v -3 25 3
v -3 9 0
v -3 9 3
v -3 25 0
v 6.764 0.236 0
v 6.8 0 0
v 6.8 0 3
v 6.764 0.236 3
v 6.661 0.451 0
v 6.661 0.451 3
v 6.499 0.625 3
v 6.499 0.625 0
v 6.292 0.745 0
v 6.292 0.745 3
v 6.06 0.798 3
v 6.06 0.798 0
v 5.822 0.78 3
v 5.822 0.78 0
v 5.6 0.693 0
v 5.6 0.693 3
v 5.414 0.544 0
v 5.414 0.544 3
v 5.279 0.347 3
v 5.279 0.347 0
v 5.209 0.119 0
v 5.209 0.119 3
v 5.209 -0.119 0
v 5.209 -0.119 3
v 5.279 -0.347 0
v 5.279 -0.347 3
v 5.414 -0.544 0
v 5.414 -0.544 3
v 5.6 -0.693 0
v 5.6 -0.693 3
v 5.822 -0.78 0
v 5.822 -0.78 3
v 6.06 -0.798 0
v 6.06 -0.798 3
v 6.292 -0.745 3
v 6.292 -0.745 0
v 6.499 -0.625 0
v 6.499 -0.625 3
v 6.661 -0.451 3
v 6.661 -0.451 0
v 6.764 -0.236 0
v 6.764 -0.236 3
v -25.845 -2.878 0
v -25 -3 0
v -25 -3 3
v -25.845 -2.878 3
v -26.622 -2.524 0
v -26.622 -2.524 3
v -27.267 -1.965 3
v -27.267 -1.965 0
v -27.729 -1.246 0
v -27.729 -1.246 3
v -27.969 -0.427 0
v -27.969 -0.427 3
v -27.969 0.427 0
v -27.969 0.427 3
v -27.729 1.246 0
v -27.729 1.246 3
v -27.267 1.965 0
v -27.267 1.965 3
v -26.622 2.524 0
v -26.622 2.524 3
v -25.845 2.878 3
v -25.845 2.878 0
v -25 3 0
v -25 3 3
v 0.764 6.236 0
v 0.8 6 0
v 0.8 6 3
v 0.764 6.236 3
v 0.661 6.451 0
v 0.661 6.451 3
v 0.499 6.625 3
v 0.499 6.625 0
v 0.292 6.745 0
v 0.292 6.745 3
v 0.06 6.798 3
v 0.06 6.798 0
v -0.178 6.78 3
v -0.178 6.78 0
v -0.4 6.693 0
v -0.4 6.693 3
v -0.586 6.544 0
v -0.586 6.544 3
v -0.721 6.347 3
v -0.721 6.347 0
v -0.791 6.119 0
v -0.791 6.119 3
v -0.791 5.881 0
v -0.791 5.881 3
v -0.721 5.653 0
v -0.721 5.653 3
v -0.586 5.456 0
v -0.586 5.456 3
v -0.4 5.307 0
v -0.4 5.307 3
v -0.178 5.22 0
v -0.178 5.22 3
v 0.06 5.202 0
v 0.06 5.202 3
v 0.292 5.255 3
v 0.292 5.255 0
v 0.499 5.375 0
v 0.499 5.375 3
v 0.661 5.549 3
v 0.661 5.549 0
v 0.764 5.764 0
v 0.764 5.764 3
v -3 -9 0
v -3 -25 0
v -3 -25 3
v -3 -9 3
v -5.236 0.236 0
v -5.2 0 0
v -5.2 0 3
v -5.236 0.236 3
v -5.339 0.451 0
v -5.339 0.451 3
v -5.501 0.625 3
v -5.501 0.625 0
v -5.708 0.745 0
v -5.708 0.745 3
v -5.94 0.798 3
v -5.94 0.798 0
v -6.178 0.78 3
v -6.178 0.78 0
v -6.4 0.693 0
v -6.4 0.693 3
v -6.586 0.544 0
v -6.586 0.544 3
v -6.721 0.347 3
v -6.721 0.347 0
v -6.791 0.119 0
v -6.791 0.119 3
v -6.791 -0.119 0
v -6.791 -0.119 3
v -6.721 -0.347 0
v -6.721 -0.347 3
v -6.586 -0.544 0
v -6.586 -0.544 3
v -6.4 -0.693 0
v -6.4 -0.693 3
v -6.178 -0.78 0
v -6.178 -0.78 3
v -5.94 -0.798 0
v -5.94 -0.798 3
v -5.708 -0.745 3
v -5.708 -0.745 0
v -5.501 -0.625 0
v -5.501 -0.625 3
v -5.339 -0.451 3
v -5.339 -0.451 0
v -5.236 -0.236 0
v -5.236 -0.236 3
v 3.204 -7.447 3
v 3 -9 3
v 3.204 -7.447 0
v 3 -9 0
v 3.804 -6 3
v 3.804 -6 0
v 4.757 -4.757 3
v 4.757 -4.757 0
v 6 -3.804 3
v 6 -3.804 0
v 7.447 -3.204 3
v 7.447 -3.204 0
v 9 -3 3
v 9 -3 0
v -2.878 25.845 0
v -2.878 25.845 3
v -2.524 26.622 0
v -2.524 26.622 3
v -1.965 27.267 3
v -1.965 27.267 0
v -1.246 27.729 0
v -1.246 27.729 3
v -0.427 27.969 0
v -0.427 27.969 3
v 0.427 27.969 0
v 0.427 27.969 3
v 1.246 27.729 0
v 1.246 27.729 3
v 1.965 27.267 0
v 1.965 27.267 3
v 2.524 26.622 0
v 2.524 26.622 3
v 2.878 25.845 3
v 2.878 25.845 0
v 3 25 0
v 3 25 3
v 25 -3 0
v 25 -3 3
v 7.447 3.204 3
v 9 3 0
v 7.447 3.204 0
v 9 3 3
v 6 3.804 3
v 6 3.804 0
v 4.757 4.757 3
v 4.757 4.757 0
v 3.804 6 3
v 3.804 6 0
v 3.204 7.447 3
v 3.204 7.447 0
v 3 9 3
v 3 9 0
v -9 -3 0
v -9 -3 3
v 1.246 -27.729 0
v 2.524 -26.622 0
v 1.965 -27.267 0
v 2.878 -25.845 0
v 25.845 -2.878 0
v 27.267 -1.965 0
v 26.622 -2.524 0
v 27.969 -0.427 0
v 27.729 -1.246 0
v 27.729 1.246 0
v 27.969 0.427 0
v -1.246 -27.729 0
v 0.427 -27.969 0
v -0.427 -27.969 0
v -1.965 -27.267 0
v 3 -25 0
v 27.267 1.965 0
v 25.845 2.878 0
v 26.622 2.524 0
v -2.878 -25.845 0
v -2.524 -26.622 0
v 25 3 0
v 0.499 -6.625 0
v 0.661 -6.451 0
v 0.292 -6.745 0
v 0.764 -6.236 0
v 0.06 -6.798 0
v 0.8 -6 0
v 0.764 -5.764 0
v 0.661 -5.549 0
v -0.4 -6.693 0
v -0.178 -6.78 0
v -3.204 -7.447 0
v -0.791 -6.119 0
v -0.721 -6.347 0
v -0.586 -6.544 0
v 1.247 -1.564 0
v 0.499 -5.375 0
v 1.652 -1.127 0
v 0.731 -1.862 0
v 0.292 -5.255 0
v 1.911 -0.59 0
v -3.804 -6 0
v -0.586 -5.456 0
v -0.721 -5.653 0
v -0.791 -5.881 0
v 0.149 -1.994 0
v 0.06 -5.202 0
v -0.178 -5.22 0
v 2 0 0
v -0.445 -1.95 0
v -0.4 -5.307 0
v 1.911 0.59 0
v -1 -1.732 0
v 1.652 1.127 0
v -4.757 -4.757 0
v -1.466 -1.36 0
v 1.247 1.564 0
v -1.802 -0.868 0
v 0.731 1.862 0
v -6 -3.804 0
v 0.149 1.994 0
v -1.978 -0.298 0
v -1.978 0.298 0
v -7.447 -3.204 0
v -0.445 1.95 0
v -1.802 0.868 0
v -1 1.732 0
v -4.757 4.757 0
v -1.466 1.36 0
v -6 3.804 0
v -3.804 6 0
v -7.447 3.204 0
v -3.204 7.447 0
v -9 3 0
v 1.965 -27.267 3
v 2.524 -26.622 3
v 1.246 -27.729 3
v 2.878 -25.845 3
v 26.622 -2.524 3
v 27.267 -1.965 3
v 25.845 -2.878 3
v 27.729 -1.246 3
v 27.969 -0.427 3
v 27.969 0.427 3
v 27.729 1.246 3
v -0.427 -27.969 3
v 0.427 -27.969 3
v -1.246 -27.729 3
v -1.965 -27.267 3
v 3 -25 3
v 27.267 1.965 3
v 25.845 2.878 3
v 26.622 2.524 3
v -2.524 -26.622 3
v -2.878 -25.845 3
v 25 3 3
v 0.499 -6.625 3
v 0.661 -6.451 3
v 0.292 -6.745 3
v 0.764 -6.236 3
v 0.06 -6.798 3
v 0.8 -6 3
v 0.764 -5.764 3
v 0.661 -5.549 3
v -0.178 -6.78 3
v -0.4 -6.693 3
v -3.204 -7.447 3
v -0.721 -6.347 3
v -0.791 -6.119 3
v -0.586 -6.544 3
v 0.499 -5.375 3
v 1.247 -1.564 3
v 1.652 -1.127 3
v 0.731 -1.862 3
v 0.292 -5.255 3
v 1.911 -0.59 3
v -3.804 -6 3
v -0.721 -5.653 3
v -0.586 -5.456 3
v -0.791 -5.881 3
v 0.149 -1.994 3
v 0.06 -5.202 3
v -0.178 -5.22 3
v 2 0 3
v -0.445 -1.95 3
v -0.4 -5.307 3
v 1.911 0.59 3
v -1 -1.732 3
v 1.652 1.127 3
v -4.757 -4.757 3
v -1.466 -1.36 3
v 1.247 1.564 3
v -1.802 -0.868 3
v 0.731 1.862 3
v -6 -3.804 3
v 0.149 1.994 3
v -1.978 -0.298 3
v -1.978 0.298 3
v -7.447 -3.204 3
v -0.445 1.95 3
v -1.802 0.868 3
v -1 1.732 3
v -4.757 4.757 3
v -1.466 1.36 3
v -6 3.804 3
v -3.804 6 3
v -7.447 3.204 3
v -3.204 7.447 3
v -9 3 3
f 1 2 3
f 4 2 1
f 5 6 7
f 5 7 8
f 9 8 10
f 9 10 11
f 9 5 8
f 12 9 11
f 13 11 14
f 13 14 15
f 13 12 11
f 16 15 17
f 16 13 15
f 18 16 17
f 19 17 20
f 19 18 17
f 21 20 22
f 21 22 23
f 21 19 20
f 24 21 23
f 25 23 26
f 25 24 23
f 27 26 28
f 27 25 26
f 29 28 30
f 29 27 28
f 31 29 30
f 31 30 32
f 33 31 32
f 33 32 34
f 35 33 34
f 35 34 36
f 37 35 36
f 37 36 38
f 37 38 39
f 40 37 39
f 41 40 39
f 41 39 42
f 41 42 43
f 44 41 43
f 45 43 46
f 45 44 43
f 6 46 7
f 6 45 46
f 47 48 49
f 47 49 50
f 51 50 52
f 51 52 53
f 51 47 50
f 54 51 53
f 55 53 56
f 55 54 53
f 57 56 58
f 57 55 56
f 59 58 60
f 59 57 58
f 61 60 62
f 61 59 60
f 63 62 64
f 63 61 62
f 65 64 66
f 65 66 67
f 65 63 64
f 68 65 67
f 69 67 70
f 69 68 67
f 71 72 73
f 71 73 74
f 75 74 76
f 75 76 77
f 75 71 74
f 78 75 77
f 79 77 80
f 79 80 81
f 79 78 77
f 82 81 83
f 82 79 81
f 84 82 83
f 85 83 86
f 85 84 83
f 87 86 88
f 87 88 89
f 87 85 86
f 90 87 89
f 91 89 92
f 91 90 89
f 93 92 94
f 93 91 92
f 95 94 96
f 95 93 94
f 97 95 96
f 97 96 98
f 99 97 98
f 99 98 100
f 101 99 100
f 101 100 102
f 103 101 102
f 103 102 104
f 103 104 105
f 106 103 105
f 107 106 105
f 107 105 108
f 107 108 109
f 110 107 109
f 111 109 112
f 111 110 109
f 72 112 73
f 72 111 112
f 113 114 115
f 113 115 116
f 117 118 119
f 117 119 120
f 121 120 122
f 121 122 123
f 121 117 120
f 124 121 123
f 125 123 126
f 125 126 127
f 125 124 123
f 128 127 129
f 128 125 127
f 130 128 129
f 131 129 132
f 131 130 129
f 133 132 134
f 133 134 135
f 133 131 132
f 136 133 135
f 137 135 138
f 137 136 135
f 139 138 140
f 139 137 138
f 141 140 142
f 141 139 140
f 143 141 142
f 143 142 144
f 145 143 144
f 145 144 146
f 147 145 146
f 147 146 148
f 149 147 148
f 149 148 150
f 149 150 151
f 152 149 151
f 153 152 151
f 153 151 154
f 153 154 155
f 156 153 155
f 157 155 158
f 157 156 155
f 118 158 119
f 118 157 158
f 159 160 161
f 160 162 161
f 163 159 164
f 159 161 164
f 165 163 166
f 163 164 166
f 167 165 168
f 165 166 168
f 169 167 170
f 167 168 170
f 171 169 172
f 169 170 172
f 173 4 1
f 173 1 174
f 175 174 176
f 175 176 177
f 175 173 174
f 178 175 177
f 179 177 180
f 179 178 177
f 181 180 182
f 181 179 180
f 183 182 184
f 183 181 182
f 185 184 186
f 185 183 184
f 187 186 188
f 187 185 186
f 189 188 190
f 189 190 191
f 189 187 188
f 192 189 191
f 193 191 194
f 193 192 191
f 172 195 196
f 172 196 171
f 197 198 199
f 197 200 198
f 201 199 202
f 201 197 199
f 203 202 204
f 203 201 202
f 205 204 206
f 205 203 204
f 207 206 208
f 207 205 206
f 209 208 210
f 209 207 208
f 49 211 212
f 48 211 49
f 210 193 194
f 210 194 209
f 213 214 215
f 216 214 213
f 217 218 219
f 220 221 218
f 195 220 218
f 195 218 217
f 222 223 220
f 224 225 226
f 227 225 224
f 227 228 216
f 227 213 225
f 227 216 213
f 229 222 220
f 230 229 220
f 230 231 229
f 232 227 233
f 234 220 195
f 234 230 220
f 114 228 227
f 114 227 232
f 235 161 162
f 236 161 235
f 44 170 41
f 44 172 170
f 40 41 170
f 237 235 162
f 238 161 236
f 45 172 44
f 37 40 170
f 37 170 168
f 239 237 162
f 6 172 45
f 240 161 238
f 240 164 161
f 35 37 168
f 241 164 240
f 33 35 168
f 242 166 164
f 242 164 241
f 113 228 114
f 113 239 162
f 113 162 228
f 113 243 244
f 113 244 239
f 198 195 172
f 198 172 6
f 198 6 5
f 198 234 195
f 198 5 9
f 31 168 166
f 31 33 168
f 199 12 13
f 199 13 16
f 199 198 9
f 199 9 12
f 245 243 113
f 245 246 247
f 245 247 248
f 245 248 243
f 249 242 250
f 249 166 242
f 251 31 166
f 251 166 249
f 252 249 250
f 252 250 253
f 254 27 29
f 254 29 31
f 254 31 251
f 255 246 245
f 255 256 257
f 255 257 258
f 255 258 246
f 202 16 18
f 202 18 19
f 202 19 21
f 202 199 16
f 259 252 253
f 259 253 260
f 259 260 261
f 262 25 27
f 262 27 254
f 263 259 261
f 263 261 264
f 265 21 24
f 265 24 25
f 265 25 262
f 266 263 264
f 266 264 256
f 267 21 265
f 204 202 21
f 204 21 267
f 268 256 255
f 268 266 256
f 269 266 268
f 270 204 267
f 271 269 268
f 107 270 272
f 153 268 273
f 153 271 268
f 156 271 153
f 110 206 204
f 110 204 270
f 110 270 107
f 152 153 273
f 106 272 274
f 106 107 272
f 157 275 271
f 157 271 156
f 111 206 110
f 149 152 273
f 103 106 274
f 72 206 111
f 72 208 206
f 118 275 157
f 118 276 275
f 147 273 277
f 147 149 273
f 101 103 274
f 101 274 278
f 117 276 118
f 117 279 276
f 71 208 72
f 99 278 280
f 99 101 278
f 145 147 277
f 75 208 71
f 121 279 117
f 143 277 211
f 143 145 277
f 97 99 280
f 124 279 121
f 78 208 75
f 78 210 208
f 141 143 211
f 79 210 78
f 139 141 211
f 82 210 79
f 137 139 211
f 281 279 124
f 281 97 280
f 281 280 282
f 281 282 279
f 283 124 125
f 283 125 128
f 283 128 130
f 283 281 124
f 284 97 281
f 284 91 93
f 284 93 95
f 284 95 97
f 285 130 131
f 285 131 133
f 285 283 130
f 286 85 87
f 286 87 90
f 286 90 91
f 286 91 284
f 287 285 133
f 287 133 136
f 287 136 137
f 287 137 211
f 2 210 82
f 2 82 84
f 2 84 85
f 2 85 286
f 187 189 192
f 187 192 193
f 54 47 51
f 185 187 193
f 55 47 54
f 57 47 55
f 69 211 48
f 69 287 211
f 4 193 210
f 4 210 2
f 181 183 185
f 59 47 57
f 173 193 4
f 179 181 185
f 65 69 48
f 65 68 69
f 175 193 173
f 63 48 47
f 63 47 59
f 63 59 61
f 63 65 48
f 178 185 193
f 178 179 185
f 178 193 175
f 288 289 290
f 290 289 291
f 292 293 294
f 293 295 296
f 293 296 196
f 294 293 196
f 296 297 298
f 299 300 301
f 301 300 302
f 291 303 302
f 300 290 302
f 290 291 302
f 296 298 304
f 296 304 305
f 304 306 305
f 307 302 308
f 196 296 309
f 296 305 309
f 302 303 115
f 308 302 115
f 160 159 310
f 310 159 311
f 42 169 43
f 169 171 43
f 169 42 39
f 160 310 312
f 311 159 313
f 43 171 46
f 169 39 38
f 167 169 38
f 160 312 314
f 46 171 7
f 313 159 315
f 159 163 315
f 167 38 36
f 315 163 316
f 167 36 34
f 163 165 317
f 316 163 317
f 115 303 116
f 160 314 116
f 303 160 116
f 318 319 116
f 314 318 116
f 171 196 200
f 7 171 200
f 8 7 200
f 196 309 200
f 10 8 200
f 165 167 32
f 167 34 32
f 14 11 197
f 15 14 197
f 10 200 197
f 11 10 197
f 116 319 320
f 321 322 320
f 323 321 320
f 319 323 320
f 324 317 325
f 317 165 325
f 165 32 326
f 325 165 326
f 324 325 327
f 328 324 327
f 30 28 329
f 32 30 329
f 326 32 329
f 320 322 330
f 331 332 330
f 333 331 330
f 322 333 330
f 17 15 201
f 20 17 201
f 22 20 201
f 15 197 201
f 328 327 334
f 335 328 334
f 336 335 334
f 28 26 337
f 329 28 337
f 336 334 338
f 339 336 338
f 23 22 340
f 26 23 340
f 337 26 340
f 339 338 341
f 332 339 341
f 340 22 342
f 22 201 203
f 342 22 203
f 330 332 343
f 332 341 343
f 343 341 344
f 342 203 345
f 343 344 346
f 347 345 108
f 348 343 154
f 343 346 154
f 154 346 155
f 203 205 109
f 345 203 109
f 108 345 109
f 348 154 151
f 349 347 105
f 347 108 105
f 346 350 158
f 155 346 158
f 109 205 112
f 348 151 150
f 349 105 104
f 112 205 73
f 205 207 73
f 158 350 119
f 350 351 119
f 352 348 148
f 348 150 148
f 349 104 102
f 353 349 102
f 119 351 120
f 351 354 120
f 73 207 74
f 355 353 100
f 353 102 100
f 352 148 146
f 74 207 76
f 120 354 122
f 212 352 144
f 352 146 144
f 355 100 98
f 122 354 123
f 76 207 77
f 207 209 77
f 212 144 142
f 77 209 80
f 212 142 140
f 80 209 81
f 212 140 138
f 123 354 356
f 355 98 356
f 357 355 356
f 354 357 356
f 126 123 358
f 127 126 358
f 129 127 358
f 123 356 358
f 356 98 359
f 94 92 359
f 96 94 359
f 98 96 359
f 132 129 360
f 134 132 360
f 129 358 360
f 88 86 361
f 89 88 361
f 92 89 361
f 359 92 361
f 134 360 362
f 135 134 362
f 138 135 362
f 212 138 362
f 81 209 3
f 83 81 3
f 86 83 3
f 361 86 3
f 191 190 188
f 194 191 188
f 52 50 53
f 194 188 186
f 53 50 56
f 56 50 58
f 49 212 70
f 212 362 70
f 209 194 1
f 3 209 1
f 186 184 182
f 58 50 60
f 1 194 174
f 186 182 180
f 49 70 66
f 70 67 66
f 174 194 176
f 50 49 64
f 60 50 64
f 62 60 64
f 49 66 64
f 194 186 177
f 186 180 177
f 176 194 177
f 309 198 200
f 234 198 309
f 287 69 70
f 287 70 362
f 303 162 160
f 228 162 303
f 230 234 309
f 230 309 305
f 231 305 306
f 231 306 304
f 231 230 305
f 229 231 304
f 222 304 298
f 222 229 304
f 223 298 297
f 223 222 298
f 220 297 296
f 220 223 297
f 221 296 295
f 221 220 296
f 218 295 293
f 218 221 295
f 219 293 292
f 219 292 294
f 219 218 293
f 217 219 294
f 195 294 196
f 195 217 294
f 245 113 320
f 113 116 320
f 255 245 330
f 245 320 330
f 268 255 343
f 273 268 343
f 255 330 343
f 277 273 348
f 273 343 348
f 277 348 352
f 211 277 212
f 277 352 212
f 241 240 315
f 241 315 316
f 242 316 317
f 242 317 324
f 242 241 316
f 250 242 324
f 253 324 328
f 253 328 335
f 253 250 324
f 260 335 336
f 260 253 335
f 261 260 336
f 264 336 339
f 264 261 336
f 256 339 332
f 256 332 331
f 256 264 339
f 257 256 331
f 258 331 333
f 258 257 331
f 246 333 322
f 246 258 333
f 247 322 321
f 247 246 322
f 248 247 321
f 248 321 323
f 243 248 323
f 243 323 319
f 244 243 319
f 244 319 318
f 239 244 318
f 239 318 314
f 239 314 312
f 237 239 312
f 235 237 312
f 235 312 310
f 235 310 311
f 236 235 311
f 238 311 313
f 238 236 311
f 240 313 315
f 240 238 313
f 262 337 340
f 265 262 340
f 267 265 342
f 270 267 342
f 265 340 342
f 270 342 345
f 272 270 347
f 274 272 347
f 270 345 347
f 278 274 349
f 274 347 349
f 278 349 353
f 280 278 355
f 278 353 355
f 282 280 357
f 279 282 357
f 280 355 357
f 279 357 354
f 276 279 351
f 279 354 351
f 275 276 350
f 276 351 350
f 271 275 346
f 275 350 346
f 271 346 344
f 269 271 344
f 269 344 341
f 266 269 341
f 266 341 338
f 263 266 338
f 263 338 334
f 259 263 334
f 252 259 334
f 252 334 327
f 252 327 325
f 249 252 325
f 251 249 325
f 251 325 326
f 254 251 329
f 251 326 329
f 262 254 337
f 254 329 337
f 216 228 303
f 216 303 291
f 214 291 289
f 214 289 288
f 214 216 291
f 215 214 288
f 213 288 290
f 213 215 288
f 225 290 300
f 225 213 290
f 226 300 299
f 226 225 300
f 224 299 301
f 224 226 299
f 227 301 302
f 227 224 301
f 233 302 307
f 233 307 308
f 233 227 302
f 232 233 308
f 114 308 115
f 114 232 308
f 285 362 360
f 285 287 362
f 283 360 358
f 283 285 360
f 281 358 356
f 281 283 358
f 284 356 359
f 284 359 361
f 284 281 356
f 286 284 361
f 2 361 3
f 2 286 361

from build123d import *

# Parameters (mm, degrees)
SKETCH1_R           = 0.8
BOSS_EXTRUDE1_DEPTH = 3
FILLET1_R           = 6
SKETCH2_R           = 2
CUT_EXTRUDE1_DEPTH  = 3


with BuildPart() as part:
    # Sketch1 → Boss-Extrude1 (new body)
    # profile 1 of 2: a face of its own
    with BuildSketch(Plane.XY):
        with BuildLine():
            Line((25, -3), (-25, -3))
            ThreePointArc((-25, -3), (-28, 0), (-25, 3))
            Line((-25, 3), (25, 3))
            ThreePointArc((25, 3), (28, 0), (25, -3))
        make_face()
        with Locations((-6, 0)):
            Circle(SKETCH1_R, mode=Mode.SUBTRACT)
        with Locations((6, 0)):
            Circle(SKETCH1_R, mode=Mode.SUBTRACT)
    # profile 2 of 2: a face of its own
    with BuildSketch(Plane.XY):
        with BuildLine():
            Line((-3, -25), (-3, 25))
            ThreePointArc((-3, 25), (0, 28), (3, 25))
            Line((3, 25), (3, -25))
            ThreePointArc((3, -25), (0, -28), (-3, -25))
        make_face()
        with Locations((0, 6)):
            Circle(SKETCH1_R, mode=Mode.SUBTRACT)
        with Locations((0, -6)):
            Circle(SKETCH1_R, mode=Mode.SUBTRACT)
    extrude(amount=BOSS_EXTRUDE1_DEPTH)

    # Fillet1
    fillet1_edges = [part.edges().sort_by_distance(p)[0] for p in [
        (3, -3, 1.5),
        (-3, -3, 1.5),
        (-3, 3, 1.5),
        (3, 3, 1.5),
    ]]
    fillet(fillet1_edges, radius=FILLET1_R)

    # Sketch2 → Cut-Extrude1 (cut)
    with BuildSketch(Plane.XY.offset(3)):
        Circle(SKETCH2_R)
    extrude(amount=-CUT_EXTRUDE1_DEPTH, mode=Mode.SUBTRACT)


solid = part.part
